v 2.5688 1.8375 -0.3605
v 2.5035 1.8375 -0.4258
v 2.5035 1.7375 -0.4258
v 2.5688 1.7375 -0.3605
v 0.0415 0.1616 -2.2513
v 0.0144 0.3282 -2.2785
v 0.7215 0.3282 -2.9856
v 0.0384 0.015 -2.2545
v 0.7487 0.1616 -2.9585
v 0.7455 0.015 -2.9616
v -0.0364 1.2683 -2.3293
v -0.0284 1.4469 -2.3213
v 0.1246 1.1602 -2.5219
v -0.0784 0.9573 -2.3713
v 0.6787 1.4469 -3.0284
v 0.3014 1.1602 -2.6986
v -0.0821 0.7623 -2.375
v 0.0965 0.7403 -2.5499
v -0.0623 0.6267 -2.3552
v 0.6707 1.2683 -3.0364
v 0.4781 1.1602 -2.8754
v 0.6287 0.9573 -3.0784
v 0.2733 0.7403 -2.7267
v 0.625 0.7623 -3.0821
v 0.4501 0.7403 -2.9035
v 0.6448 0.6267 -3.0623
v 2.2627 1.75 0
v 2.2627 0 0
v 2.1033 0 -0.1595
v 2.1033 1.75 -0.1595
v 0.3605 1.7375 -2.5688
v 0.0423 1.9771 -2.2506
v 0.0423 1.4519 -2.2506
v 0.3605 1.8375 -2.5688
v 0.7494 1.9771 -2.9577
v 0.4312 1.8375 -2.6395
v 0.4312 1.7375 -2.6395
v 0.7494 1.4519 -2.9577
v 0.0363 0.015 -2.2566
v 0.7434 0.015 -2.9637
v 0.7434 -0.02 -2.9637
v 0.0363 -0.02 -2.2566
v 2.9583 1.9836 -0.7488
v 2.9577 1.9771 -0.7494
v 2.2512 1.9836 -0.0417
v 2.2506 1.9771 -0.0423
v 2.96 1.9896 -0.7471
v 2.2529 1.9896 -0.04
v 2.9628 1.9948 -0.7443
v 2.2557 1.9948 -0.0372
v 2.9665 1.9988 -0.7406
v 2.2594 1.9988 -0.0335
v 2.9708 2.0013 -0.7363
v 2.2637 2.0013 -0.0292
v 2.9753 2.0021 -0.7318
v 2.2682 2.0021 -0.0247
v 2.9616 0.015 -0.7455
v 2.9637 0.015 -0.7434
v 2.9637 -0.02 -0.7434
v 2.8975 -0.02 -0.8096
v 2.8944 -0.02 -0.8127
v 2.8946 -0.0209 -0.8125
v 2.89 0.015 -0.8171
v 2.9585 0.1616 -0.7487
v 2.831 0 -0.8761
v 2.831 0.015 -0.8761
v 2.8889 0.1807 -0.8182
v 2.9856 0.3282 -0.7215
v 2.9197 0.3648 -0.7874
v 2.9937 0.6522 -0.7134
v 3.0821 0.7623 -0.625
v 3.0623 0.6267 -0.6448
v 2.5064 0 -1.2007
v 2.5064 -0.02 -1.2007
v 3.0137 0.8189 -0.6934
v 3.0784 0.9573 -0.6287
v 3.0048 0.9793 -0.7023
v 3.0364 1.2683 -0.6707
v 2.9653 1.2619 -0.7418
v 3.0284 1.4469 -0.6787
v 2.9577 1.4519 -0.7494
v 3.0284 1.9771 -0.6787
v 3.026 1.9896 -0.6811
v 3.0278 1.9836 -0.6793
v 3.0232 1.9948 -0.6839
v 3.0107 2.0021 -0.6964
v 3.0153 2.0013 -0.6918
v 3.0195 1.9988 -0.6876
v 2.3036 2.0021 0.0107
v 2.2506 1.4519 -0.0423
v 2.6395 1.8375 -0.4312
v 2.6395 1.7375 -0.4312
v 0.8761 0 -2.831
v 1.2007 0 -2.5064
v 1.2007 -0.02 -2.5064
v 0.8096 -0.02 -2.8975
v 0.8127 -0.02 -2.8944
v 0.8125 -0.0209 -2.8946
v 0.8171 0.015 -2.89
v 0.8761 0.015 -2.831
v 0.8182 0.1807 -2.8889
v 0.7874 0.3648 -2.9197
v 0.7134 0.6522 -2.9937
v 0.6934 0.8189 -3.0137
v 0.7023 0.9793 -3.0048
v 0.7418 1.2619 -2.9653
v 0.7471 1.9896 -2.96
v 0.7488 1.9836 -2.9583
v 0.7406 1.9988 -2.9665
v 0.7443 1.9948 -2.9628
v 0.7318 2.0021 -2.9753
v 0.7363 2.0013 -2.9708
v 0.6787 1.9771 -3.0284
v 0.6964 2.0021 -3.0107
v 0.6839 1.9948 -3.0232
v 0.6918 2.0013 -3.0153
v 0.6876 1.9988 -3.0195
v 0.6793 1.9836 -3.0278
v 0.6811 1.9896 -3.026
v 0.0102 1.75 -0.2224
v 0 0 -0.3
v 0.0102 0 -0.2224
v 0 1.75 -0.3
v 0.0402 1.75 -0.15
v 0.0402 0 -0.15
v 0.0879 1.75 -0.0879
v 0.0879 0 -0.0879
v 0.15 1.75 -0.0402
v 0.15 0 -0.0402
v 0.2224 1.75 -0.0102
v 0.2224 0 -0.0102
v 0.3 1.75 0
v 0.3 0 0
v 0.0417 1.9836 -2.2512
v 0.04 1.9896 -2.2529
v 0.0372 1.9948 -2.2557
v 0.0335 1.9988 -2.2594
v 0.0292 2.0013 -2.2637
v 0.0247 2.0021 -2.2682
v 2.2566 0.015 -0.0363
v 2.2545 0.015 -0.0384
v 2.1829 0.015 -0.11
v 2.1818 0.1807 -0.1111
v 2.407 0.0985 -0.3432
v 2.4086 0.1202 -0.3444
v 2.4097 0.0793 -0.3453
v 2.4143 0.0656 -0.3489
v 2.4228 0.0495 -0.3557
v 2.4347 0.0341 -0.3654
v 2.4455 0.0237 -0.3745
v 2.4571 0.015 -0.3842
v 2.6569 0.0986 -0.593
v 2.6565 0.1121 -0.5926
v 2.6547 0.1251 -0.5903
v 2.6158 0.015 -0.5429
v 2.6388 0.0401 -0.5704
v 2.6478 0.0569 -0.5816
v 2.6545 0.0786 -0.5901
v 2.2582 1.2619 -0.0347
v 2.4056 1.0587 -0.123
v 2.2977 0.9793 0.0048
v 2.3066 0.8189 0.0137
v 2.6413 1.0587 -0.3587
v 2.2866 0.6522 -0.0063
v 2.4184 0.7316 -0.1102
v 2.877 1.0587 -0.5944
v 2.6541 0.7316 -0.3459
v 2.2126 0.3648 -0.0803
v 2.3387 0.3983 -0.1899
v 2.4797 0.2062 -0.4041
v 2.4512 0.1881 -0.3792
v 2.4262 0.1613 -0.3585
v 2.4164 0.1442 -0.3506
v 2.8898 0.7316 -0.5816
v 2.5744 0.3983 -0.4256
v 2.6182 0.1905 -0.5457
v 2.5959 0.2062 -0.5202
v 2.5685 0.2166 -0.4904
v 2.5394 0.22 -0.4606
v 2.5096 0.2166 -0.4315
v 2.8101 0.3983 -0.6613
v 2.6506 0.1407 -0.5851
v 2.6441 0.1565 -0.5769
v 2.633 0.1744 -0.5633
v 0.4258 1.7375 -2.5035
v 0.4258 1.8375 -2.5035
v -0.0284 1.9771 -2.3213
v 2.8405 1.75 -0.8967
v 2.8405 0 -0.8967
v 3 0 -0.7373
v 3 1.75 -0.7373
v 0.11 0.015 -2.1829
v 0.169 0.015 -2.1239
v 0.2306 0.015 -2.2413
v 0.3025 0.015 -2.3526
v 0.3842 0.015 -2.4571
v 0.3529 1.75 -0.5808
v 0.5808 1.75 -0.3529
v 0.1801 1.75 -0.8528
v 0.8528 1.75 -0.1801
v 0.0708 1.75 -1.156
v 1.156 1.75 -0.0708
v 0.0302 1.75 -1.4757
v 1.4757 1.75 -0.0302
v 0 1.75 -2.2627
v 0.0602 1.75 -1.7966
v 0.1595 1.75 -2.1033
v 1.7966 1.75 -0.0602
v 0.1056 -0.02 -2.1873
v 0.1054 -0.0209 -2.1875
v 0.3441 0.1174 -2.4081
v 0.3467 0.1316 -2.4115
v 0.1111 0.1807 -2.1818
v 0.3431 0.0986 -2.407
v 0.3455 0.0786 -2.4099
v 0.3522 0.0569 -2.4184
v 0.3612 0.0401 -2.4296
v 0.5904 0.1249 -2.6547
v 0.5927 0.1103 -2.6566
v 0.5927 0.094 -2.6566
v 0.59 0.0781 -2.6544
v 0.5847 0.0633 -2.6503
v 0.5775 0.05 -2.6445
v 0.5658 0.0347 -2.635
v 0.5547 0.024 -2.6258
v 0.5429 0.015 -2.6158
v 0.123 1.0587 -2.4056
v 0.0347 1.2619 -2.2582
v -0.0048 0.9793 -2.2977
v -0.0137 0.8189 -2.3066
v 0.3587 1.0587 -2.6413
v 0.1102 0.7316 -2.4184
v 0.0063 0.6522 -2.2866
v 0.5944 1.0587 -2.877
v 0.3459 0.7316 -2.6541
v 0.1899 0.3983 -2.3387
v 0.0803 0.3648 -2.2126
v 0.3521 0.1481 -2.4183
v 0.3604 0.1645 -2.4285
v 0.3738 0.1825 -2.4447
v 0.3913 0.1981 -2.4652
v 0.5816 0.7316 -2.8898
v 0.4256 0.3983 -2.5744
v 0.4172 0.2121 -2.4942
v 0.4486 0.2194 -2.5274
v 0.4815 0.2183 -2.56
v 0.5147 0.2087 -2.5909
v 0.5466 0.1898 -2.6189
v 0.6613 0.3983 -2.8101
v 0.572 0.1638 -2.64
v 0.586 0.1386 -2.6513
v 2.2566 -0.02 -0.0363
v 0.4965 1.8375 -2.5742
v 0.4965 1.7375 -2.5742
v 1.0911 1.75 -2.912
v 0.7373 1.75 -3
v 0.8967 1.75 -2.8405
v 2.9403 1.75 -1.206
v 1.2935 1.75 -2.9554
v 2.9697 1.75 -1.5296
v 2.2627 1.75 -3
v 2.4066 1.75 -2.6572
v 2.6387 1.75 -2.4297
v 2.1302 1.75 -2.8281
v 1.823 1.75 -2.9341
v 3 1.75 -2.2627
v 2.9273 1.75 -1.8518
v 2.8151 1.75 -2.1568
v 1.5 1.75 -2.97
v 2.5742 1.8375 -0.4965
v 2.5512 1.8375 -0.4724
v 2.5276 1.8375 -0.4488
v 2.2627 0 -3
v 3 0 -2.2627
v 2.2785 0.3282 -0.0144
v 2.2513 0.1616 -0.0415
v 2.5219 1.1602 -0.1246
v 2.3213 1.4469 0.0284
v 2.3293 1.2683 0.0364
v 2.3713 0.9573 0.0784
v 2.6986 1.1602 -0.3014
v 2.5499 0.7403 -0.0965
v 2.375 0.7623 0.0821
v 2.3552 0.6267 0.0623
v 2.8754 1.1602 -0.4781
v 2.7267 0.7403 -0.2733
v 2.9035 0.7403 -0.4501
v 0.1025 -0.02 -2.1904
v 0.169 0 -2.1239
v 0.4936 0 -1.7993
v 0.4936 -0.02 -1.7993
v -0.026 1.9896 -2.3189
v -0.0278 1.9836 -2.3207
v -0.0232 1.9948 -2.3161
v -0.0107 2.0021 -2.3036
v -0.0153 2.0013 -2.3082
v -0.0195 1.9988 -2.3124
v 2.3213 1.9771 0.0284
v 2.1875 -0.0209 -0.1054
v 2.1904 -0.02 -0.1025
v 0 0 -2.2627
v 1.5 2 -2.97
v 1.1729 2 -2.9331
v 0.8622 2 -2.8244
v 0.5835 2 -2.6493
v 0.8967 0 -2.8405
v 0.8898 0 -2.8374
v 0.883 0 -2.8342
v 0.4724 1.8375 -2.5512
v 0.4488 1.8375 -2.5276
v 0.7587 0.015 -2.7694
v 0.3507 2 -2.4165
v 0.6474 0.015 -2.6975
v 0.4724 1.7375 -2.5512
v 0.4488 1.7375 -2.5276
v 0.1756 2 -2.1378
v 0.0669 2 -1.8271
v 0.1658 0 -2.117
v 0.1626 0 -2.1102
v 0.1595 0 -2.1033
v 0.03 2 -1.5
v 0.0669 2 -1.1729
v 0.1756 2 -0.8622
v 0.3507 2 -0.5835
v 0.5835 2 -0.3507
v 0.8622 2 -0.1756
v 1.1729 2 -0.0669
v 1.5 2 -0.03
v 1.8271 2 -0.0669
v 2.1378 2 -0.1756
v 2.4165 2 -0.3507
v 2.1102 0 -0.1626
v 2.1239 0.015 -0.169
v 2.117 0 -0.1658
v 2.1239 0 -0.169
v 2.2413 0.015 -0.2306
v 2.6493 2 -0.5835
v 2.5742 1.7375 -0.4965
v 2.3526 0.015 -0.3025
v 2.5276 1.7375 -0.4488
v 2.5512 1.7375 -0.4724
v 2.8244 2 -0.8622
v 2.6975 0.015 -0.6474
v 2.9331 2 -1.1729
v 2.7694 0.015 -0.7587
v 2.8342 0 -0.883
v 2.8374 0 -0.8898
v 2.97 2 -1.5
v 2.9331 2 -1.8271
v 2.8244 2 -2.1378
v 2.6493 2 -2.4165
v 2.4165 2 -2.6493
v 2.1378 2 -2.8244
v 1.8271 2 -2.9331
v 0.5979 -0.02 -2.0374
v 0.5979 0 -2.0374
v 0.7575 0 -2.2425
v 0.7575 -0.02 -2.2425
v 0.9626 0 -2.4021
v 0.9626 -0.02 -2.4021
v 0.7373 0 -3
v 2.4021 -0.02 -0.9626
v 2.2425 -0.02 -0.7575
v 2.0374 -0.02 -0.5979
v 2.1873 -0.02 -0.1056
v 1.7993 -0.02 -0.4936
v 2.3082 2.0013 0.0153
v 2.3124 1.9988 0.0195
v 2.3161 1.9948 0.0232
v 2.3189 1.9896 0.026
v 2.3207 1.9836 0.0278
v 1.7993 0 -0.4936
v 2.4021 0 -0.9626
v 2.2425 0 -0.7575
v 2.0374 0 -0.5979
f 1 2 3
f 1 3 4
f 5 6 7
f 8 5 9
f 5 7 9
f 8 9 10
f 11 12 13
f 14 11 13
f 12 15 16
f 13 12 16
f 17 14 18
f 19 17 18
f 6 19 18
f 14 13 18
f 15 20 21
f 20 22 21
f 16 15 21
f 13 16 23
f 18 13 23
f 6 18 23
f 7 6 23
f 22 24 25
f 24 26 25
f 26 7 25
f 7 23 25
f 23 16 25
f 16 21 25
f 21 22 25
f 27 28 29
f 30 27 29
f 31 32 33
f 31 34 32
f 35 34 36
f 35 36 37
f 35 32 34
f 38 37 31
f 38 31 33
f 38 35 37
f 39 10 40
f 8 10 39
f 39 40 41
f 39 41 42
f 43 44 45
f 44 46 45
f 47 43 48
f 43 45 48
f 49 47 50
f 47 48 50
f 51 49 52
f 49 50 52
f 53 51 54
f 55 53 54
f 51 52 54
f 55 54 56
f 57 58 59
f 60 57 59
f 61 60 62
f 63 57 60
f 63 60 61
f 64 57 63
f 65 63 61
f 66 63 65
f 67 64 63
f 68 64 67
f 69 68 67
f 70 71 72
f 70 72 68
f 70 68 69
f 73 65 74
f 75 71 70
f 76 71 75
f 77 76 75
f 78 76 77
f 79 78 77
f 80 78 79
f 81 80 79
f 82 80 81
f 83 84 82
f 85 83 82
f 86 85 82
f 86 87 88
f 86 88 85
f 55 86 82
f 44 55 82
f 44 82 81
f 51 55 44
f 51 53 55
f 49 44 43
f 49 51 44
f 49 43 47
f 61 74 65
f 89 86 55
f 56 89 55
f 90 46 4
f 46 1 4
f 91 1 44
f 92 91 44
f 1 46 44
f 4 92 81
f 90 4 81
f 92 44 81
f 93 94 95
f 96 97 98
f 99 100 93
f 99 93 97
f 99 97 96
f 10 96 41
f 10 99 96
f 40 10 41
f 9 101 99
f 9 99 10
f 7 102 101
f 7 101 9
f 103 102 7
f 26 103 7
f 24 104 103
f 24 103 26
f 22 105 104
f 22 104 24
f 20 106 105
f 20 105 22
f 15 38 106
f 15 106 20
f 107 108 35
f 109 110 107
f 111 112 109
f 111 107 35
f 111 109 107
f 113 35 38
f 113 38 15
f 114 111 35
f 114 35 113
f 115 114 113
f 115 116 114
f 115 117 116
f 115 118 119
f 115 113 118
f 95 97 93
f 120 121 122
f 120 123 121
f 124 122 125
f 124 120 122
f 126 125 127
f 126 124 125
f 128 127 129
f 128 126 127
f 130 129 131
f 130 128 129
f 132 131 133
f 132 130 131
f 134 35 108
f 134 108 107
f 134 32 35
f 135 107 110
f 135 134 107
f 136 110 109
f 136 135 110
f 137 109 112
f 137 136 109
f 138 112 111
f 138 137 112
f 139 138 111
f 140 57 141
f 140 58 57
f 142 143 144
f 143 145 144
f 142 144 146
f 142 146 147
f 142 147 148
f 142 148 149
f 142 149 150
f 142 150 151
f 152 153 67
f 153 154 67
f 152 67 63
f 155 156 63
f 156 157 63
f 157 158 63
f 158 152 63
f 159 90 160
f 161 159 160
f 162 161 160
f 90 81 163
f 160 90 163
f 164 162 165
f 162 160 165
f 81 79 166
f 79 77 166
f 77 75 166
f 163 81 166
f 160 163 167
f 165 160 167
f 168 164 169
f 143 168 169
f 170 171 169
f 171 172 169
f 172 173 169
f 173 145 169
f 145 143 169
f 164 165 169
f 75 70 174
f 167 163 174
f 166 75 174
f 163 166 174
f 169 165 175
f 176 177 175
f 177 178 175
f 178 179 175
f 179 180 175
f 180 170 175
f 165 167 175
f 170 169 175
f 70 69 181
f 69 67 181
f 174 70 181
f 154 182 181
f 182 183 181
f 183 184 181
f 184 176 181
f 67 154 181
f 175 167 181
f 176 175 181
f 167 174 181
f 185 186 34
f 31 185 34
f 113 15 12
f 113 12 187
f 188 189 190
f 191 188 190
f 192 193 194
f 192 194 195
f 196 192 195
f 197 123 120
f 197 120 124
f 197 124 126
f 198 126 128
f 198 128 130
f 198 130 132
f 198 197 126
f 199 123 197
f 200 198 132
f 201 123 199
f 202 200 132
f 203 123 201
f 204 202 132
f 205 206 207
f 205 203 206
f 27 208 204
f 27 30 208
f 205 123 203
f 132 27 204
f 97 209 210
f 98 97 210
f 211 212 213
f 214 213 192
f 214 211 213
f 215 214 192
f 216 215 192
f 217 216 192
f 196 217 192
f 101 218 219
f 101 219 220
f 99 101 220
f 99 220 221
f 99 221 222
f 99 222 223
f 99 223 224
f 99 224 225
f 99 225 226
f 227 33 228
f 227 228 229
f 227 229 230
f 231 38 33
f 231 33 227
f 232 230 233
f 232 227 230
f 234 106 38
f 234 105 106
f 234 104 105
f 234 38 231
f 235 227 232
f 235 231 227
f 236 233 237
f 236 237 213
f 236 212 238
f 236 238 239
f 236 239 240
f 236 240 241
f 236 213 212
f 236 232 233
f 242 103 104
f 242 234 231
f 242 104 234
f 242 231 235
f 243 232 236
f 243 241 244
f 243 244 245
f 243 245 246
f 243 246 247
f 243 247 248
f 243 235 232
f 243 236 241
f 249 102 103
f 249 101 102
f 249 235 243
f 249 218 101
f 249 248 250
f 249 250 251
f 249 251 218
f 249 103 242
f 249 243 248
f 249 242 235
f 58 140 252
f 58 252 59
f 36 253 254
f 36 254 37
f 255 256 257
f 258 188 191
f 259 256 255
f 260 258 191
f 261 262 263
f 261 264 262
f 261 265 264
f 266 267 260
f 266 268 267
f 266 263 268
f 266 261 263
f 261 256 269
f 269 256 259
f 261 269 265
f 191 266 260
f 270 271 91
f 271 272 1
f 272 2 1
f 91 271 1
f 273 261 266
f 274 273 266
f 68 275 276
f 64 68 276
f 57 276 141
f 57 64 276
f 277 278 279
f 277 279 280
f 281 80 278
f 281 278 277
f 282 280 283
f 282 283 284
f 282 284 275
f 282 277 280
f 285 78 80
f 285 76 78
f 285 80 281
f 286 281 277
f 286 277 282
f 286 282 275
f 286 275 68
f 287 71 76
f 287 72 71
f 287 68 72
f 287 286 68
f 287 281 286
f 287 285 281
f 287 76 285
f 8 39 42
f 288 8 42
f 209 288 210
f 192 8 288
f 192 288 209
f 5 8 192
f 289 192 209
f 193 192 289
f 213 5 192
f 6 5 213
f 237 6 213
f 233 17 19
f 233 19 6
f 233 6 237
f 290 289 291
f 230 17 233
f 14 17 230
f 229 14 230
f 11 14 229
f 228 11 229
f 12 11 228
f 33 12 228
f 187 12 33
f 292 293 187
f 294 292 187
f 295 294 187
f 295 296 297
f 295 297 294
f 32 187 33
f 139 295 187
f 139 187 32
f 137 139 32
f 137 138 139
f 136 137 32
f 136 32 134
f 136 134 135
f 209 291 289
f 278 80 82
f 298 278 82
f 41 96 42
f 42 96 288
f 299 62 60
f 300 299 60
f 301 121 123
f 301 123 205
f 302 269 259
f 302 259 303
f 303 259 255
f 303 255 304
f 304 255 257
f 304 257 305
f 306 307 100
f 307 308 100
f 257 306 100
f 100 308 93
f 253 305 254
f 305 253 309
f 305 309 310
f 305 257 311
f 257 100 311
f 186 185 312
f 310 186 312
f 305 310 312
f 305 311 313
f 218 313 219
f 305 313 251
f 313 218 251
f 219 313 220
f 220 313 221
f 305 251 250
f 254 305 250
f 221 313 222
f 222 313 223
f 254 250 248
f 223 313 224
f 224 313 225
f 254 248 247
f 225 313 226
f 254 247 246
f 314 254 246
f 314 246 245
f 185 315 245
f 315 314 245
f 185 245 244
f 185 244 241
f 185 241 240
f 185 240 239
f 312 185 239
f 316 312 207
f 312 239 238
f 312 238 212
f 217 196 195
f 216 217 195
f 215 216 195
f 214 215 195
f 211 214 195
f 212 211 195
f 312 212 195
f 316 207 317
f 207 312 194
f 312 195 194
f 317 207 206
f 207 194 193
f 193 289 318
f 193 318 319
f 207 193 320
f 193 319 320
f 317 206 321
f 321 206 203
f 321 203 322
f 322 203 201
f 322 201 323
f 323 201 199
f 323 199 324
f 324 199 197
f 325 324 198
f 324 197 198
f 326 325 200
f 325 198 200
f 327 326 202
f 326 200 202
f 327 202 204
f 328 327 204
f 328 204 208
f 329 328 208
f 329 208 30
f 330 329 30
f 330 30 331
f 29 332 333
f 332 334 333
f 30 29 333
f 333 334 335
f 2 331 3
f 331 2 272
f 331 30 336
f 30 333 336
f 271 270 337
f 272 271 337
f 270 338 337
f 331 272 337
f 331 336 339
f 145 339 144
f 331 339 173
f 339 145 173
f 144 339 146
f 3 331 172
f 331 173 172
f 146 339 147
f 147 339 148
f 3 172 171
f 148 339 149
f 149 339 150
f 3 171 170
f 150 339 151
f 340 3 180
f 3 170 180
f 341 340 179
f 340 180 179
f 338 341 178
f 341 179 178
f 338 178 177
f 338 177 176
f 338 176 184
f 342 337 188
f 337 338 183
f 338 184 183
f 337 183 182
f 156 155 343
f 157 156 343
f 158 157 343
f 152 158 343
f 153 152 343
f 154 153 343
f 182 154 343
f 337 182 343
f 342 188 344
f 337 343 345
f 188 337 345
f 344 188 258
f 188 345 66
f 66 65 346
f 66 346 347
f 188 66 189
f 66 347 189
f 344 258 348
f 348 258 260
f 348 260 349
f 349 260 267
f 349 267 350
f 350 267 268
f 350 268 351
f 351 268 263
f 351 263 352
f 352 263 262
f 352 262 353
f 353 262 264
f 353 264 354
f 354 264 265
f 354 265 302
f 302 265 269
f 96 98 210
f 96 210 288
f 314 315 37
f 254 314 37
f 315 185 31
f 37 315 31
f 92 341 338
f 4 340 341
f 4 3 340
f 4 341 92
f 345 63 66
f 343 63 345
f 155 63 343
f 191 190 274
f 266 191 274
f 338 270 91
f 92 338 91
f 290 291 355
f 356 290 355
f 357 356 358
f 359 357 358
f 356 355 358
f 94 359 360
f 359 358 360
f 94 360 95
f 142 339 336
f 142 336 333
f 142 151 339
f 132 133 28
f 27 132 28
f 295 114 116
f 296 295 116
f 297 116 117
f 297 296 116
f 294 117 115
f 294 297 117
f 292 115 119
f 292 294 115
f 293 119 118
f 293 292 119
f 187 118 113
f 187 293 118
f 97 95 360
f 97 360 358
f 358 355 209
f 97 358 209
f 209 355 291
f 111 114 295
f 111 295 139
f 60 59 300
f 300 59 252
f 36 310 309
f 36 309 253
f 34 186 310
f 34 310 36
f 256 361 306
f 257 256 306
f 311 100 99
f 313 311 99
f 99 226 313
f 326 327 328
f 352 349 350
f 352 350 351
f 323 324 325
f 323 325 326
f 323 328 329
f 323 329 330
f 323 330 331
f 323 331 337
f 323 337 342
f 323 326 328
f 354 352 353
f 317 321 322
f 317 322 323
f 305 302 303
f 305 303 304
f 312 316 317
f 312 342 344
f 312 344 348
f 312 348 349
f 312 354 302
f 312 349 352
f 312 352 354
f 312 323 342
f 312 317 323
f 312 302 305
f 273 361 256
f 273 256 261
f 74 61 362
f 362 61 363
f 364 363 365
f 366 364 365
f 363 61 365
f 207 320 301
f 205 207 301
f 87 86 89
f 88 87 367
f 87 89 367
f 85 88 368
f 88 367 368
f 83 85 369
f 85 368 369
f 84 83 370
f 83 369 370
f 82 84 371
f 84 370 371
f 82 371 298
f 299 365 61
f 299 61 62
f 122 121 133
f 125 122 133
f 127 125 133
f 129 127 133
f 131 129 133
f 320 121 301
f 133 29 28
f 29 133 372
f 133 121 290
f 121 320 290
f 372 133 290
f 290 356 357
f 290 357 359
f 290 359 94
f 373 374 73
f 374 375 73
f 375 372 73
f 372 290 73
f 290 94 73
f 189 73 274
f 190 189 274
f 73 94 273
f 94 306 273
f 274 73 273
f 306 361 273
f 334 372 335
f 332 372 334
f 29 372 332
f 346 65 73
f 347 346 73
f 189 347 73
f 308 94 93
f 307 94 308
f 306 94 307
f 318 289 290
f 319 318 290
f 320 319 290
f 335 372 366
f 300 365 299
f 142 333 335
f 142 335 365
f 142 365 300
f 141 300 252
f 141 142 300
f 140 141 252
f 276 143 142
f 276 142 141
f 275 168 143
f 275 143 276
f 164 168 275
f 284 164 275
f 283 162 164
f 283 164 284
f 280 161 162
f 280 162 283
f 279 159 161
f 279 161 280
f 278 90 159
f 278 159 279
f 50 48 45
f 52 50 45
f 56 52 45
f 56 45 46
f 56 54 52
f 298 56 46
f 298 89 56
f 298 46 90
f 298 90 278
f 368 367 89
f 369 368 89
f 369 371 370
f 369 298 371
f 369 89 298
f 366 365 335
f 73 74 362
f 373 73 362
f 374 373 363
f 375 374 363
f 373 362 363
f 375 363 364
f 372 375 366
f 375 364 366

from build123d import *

# Parameters (mm, degrees)
SKETCH1_W            = 3
SKETCH1_H            = 3
BOSS_EXTRUDE1_DEPTH  = 1.75
CUT_EXTRUDE1_DEPTH   = 5.589389938
FILLET2_R            = 0.3
SKETCH4_R            = 1.47
BOSS_EXTRUDE2_DEPTH  = 0.25
CUT_EXTRUDE2_START   = -1.75
CUT_EXTRUDE2_DEPTH   = 1.75
EXTRUDE_THIN2_START  = -0.5
EXTRUDE_THIN2_DEPTH  = 1
SKETCH8_W            = 0.275860762
SKETCH8_H            = 0.1
EXTRUDE_THIN5_DEPTH  = 0.05
FILLET3_R            = 0.025
FILLET3_OF_MIRROR1_R = 0.025
BOSS_EXTRUDE3_START  = -0.015
BOSS_EXTRUDE3_DEPTH  = 0.035
SKETCH11_R           = 1.05
CUT_EXTRUDE3_DEPTH   = 0.02


# Read off the part's stored shape, not the designer's step: Extrude-Thin2
with BuildPart() as part:
    # Sketch1 → Boss-Extrude1 (new body)
    with BuildSketch(Plane(origin=(0, 0, 0), x_dir=(1, 0, 0), z_dir=(0, 1, 0))):
        with Locations((1.5, 1.5)):
            Rectangle(SKETCH1_W, SKETCH1_H)
    extrude(amount=BOSS_EXTRUDE1_DEPTH)

    # Sketch3 → Cut-Extrude1 (cut, through all)
    with BuildSketch(Plane(origin=(0, 1.75, 0), x_dir=(1, 0, 0), z_dir=(0, 1, 0))):
        Polygon((2.2627417, 0), (3, 0), (3, 0.7372583), (2.63137085, 0.36862915), align=None)
        Polygon((0, 3), (0, 2.2627417), (0.36862915, 2.63137085), (0.7372583, 3), align=None)
        Polygon((2.63137085, 2.63137085), (2.2627417, 3), (3, 3), (3, 2.2627417), align=None)
    extrude(amount=-CUT_EXTRUDE1_DEPTH, mode=Mode.SUBTRACT)

    # Fillet2
    fillet2_edges = [part.edges().sort_by_distance(p)[0] for p in [
        (0, 0.875, 0),
    ]]
    fillet(fillet2_edges, radius=FILLET2_R)

    # Sketch4 → Boss-Extrude2 (add)
    with BuildSketch(Plane(origin=(0, 1.75, 0), x_dir=(1, 0, 0), z_dir=(0, 1, 0))):
        with Locations(Location((1.5, 1.5, 0), (0, 0, 90))):
            Circle(SKETCH4_R)
    extrude(amount=BOSS_EXTRUDE2_DEPTH)

    # Sketch5 → Cut-Extrude2 (cut)
    with BuildSketch(Plane(origin=(0, 1.75, 0), x_dir=(1, 0, 0), z_dir=(0, 1, 0)).offset(CUT_EXTRUDE2_START)):
        with BuildLine():
            Line((2.2627417, 0), (2.103256928, 0.159484771))
            ThreePointArc((2.103256928, 0.159484771), (2.539446968, 0.460553032), (2.840515229, 0.896743072))
            Line((2.840515229, 0.896743072), (3, 0.7372583))
            Line((3, 0.7372583), (2.2627417, 0))
        make_face()
        with BuildLine():
            Line((0, 2.2627417), (0.7372583, 3))
            Line((0.7372583, 3), (0.896743072, 2.840515229))
            ThreePointArc((0.896743072, 2.840515229), (0.460553032, 2.539446968), (0.159484771, 2.103256928))
            Line((0.159484771, 2.103256928), (0, 2.2627417))
        make_face()
    extrude(amount=CUT_EXTRUDE2_DEPTH, mode=Mode.SUBTRACT)

    # Extrude-Thin2 outline → Extrude-Thin2 (add)
    with BuildSketch(Plane(origin=(1.5, 0, -1.5), x_dir=(0.7071067811865562, 0, 0.7071067811865389), z_dir=(-0.7071067811865389, 0, 0.7071067811865562)).offset(EXTRUDE_THIN2_START)):
        with BuildLine():
            Line((1.561450527, 2.002149754), (1.561450527, 1.451909895))
            add(Edge.make_bspline(
                [(1.561450527, 1.451909895), (1.554129937, 1.375541591), (1.563884147, 1.305446664), (1.588296687, 1.177370221), (1.602428817, 1.117821497), (1.625651298, 0.999523371), (1.634934751, 0.941975625), (1.642707118, 0.832429946), (1.641292118, 0.781821785), (1.613986886, 0.631102389), (1.563318355, 0.52128951), (1.475495605, 0.275380517), (1.439010548, 0.134450447), (1.472207974, -0.02089784)],
                knots=[0, 0, 0, 0, 0.125, 0.125, 0.25, 0.25, 0.375, 0.375, 0.5, 0.5, 0.75, 0.75, 1, 1, 1, 1], degree=3))
            Line((1.472207974, -0.02089784), (1.57, 0))
            add(Edge.make_bspline(
                [(1.661450527, 1.446877551), (1.653220606, 1.369619132), (1.670197461, 1.275795935), (1.720944437, 1.040930532), (1.805154039, 0.618915062), (1.512916634, 0.267123211), (1.57, 0)],
                knots=[0, 0, 0, 0, 0.155054635, 0.196256757, 0.482900157, 1, 1, 1, 1], degree=3))
            Line((1.661450527, 1.446877551), (1.661450527, 2.002149754))
            Line((1.661450527, 2.002149754), (1.561450527, 2.002149754))
        make_face()
    extrude_thin2 = extrude(amount=EXTRUDE_THIN2_DEPTH)

    # Sketch8 → Extrude-Thin5 (add, symmetric)
    with BuildSketch(Plane(origin=(1.5, 0, -1.5), x_dir=(0.7071067811865562, 0, 0.7071067811865389), z_dir=(-0.7071067811865389, 0, 0.7071067811865562))):
        with Locations((1.518388241, 1.787476875)):
            Rectangle(SKETCH8_W, SKETCH8_H)
    extrude_thin5 = extrude(amount=EXTRUDE_THIN5_DEPTH, both=True)

    # Fillet3
    fillet3_edges = [part.edges().sort_by_distance(p)[0] for p in [
        (2.674822934, 2.002149754, -0.325177066),
        (2.604112256, 2.002149754, -0.395887744),
    ]]
    fillet(fillet3_edges, radius=FILLET3_R)

    # Mirror1: Extrude-Thin2, Extrude-Thin5 across plane
    add(extrude_thin2.mirror(Plane(origin=(0, 0, 0), x_dir=(-0.7071067811865466, 0, 0.7071067811865486), z_dir=(0.7071067811865487, 0, 0.7071067811865465))))
    add(extrude_thin5.mirror(Plane(origin=(0, 0, 0), x_dir=(-0.7071067811865466, 0, 0.7071067811865486), z_dir=(0.7071067811865487, 0, 0.7071067811865465))))

    # Fillet3 of Mirror1
    fillet3_of_mirror1_edges = [part.edges().sort_by_distance(p)[0] for p in [
        (0.325177066, 2.002149754, -2.674822934),
        (0.395887744, 2.002149754, -2.604112256),
    ]]
    fillet(fillet3_of_mirror1_edges, radius=FILLET3_OF_MIRROR1_R)

    # Sketch10 → Boss-Extrude3 (add)
    with BuildSketch(Plane.XZ.offset(BOSS_EXTRUDE3_START)):
        Polygon((0.036288963, -2.256604256), (2.256604256, -0.036288963), (2.963711037, -0.743395744), (0.743395744, -2.963711037), align=None)
    extrude(amount=BOSS_EXTRUDE3_DEPTH)

    # Sketch11 → Cut-Extrude3 (cut)
    with BuildSketch(Plane.XZ.offset(0.02)):
        with Locations((1.5, -1.5)):
            Circle(SKETCH11_R)
    extrude(amount=-CUT_EXTRUDE3_DEPTH, mode=Mode.SUBTRACT)


solid = part.part
